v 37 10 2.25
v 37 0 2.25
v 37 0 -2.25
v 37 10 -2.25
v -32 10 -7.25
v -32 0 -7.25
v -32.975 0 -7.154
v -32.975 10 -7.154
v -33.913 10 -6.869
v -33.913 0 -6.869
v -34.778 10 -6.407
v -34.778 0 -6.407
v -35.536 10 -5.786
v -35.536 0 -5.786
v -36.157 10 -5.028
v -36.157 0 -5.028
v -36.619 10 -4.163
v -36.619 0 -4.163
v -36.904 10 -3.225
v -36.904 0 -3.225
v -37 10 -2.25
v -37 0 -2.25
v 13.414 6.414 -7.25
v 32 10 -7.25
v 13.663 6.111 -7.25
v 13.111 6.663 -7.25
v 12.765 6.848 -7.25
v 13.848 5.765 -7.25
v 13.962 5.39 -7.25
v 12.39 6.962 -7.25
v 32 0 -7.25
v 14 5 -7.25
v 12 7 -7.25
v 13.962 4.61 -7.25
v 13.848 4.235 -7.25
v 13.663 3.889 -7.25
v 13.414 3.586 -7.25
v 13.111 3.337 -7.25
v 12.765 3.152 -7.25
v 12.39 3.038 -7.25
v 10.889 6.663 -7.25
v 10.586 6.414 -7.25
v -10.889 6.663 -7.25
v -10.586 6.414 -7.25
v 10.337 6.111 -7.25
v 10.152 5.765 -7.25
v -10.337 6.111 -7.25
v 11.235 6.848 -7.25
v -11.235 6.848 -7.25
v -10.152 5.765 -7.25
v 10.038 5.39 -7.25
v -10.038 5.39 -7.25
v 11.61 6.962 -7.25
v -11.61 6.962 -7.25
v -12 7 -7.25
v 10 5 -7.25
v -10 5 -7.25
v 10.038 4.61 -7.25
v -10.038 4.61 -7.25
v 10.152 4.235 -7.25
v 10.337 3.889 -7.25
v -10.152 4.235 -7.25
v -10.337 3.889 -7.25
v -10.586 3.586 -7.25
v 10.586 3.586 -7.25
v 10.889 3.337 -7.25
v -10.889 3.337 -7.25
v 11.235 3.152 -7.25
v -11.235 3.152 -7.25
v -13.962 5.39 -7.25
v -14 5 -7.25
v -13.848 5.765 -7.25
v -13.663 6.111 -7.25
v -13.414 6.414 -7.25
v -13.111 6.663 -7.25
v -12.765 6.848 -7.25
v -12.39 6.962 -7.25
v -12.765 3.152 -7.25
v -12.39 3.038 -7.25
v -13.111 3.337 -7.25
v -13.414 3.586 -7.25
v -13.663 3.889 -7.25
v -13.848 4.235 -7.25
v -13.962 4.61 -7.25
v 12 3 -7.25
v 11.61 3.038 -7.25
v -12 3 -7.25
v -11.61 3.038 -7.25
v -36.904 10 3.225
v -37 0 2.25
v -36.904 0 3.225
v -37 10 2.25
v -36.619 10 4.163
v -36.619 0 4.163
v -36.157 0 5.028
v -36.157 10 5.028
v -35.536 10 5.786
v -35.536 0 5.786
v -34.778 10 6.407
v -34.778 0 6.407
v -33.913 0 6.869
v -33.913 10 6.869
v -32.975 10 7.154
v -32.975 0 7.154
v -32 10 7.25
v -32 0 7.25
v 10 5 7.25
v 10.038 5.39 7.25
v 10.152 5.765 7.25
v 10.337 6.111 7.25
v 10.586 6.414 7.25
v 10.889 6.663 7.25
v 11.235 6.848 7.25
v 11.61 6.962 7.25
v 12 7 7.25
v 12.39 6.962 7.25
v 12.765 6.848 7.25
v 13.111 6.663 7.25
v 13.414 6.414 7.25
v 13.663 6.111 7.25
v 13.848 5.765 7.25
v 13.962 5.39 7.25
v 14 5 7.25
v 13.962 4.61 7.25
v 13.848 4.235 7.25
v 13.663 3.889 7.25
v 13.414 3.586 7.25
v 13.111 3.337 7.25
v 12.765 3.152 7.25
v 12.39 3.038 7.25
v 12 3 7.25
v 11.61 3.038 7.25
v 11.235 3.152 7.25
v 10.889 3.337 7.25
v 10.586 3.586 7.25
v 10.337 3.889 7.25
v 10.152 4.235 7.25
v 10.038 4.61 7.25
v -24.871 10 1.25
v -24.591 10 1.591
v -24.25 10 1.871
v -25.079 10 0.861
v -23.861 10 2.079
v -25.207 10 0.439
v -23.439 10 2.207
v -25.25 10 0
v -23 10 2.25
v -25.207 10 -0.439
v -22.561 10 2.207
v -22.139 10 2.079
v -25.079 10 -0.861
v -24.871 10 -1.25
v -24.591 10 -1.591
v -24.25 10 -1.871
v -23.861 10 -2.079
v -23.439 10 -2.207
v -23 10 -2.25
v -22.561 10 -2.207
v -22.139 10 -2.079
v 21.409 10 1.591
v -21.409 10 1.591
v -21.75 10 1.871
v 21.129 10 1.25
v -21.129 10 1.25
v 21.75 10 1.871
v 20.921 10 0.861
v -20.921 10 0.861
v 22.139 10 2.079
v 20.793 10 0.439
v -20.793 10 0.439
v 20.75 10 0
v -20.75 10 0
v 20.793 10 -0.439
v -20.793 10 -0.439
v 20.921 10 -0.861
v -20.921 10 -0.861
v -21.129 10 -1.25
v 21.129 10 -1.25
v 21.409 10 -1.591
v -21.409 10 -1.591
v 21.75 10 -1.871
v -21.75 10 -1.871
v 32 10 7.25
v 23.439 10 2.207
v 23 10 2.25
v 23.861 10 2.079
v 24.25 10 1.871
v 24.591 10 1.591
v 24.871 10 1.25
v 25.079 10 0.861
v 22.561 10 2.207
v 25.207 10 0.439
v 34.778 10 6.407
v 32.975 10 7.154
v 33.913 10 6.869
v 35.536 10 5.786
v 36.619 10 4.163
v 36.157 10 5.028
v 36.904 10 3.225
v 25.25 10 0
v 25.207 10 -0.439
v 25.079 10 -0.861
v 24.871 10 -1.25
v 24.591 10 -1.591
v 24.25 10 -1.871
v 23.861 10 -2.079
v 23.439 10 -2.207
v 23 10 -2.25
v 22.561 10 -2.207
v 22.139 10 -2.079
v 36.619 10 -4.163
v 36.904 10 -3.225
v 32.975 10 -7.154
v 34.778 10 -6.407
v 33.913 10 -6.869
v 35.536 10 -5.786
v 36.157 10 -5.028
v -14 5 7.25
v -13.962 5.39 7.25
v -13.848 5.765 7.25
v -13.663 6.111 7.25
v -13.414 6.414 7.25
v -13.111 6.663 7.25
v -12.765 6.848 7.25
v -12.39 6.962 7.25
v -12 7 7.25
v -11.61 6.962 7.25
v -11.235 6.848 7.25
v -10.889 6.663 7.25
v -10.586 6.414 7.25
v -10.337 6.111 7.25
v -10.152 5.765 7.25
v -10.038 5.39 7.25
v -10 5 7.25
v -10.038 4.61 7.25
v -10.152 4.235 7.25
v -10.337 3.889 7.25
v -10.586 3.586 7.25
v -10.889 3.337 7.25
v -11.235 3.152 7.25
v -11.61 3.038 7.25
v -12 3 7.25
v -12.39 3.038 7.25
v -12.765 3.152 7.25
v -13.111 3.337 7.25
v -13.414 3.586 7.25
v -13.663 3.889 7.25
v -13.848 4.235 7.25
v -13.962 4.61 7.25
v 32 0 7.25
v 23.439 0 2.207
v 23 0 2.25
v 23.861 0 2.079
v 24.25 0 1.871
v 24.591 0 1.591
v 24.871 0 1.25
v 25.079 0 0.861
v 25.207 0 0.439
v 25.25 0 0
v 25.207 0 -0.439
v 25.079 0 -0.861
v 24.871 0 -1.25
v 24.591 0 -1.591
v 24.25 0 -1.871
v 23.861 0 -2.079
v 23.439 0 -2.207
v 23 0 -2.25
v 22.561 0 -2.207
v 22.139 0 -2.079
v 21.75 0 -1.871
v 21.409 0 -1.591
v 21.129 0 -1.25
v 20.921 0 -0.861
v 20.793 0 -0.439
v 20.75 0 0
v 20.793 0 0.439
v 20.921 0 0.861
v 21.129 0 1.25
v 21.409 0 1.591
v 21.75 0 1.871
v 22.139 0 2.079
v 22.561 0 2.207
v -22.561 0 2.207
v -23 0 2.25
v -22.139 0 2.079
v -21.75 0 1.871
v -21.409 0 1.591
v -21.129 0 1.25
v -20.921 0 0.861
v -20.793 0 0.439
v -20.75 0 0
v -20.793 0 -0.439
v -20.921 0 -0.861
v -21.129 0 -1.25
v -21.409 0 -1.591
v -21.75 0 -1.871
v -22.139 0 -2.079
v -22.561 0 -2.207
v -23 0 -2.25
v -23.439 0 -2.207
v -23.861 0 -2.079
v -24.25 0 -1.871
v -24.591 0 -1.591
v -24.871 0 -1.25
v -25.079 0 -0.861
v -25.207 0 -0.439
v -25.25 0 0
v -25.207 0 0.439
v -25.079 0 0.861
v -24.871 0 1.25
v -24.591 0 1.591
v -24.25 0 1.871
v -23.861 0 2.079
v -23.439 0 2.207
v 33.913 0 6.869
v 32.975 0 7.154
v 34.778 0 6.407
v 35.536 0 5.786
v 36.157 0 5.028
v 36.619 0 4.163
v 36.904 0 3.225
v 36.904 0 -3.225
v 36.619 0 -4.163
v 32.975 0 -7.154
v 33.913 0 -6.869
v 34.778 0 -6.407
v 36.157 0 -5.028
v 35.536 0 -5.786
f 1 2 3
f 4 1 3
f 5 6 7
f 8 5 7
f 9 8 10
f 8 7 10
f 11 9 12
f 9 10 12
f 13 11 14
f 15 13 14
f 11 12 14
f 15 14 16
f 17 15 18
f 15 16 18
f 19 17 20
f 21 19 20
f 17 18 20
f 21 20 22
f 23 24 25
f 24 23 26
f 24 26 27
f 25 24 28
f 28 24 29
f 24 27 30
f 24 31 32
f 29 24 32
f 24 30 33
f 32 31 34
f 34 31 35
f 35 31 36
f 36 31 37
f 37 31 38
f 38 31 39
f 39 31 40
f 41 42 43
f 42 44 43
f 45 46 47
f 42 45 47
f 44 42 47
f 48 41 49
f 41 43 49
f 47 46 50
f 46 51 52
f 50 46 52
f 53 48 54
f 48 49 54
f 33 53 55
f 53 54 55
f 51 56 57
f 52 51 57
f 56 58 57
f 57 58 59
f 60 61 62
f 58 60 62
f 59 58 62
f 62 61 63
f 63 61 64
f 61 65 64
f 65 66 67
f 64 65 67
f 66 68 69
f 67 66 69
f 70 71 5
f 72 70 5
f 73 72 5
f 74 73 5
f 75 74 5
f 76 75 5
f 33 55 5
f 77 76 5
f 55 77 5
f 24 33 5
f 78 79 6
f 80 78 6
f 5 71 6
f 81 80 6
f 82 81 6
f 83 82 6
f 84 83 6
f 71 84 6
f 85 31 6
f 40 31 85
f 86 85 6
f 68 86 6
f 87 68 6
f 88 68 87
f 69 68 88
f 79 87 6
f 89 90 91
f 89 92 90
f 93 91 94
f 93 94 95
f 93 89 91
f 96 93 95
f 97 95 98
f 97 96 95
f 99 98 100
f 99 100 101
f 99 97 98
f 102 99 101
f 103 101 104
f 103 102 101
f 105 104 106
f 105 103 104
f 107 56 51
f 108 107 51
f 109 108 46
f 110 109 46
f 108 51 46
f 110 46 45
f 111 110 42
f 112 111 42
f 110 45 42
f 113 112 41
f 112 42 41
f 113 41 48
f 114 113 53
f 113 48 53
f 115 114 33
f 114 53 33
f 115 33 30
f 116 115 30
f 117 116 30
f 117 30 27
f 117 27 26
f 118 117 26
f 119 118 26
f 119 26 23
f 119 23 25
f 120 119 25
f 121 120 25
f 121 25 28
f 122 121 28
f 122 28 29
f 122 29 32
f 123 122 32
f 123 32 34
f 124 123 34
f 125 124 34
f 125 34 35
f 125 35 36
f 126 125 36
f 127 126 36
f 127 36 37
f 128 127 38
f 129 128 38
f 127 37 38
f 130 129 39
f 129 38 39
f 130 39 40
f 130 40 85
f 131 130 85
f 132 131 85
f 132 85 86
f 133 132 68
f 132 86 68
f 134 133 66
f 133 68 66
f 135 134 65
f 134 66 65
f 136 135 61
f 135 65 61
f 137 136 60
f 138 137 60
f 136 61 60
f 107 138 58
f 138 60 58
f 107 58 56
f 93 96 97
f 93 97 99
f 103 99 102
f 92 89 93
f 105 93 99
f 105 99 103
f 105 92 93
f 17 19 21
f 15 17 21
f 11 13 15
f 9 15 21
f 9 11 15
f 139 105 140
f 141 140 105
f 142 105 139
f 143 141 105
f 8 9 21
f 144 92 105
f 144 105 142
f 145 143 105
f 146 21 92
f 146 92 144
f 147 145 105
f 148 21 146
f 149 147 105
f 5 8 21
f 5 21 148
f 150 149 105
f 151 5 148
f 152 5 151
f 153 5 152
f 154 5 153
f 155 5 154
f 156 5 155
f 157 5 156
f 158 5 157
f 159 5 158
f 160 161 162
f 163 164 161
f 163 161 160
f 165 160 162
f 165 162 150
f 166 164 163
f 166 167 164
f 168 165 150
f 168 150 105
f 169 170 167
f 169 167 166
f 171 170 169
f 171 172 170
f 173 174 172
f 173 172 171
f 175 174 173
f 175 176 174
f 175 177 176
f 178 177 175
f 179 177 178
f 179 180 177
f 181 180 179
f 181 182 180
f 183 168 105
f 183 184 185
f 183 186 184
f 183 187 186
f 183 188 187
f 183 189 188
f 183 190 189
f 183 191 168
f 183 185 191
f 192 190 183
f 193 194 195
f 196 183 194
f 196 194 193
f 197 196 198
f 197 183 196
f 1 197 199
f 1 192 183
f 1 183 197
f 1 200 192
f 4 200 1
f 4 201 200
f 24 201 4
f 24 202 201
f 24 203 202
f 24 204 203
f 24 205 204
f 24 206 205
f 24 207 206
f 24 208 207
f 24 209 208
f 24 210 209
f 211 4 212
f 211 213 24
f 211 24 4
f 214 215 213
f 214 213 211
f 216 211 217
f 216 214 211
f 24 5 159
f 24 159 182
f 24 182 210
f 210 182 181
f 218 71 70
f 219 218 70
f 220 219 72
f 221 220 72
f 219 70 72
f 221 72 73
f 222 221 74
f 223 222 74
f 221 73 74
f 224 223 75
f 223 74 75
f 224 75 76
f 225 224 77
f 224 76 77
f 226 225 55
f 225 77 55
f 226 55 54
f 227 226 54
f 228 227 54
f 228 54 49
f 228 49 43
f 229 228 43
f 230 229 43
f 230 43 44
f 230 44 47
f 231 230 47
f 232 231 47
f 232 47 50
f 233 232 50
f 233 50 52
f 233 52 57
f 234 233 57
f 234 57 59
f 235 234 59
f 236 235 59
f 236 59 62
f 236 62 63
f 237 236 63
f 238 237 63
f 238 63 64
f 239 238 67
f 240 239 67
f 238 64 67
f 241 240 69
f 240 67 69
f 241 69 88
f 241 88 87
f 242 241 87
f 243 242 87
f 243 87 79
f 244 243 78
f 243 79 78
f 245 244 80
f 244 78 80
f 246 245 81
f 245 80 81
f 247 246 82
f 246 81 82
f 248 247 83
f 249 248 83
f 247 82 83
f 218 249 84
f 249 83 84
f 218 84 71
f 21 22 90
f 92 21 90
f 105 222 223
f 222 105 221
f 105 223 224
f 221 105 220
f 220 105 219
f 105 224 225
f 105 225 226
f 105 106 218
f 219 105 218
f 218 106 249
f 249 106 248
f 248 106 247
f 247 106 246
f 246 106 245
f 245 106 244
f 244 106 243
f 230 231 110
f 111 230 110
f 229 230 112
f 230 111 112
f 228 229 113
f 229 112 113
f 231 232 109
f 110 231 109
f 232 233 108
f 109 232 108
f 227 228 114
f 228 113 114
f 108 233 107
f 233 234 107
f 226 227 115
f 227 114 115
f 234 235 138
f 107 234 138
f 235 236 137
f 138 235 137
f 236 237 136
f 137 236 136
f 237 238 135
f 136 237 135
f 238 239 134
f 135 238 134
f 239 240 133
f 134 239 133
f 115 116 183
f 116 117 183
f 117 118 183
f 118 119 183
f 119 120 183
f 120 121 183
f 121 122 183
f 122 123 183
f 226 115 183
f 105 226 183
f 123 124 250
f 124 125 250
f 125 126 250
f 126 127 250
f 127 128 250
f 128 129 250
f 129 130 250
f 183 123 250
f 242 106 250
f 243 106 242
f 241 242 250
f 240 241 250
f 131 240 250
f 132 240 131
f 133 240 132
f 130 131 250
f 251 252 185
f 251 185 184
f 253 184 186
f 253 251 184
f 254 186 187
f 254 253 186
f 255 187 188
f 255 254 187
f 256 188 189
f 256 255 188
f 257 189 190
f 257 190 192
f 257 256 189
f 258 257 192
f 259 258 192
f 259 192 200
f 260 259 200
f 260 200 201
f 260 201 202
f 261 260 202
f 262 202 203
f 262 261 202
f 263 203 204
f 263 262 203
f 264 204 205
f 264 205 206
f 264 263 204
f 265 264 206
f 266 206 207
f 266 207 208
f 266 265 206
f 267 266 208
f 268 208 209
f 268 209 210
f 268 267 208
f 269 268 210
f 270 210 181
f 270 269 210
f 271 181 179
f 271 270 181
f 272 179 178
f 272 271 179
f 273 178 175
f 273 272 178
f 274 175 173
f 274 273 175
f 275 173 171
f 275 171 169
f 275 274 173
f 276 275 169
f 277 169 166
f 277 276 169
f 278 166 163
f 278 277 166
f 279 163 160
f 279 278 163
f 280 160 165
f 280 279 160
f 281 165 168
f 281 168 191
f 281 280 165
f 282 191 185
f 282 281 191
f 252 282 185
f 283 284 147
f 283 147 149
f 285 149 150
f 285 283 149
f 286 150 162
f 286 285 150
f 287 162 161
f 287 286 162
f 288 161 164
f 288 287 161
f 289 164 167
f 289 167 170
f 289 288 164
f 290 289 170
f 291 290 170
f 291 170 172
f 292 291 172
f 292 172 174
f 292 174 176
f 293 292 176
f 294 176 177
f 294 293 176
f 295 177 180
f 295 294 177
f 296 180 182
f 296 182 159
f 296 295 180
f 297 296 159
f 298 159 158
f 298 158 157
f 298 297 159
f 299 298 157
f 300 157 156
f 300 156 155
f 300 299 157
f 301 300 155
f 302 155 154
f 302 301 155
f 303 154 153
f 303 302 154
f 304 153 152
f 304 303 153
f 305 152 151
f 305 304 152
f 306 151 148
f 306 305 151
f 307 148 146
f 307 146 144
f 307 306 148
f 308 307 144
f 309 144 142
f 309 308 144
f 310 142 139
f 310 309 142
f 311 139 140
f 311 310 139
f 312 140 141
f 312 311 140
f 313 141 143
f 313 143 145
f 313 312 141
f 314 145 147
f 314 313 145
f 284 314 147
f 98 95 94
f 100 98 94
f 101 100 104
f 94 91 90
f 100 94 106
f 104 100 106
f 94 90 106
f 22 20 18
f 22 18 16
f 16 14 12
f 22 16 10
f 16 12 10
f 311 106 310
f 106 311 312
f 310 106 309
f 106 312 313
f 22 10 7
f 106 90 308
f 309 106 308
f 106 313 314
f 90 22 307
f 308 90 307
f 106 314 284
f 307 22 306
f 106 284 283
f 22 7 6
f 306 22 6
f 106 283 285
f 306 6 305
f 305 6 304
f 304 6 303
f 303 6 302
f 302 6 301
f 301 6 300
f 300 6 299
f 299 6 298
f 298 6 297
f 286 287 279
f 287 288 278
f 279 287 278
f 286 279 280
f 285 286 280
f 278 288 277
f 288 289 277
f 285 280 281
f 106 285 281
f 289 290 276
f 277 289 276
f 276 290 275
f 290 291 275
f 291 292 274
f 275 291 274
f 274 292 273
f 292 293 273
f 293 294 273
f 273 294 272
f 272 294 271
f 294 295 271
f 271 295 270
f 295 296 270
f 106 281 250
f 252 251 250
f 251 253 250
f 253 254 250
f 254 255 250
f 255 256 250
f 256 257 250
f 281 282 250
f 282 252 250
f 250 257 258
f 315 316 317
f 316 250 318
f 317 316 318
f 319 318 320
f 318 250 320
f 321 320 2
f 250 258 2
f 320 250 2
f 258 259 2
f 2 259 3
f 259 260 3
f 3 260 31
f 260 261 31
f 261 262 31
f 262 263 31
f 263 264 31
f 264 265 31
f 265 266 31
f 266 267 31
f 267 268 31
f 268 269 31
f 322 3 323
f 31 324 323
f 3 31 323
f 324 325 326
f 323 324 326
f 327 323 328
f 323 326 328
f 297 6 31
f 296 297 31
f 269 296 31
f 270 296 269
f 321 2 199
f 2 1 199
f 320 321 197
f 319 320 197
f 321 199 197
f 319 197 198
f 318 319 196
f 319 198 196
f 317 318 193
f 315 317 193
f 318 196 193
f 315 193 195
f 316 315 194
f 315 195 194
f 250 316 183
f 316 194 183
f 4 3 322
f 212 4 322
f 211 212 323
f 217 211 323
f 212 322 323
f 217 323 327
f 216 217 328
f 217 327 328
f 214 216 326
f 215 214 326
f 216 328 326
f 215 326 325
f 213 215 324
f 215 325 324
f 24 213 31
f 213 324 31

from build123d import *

# Parameters (mm, degrees)
SKETCH1_R           = 2.25
BOSS_EXTRUDE1_DEPTH = 10
FILLET1_R           = 5
SKETCH2_R           = 2
CUT_EXTRUDE1_DEPTH  = 24


with BuildPart() as part:
    # Sketch1 → Boss-Extrude1 (new body)
    with BuildSketch(Plane(origin=(0, 0, 0), x_dir=(1, 0, 0), z_dir=(0, 1, 0))):
        with BuildLine():
            Line((32, 7.25), (-32, 7.25))
            ThreePointArc((-32, 7.25), (-35.535533906, 5.785533906), (-37, 2.25))
            Line((-37, 2.25), (-37, -7.25))
            Line((-37, -7.25), (37, -7.25))
            Line((37, -7.25), (37, 2.25))
            ThreePointArc((37, 2.25), (35.535533906, 5.785533906), (32, 7.25))
        make_face()
        with Locations(Location((23, 0, 0), (0, 0, 270))):
            Circle(SKETCH1_R, mode=Mode.SUBTRACT)
        with Locations(Location((-23, 0, 0), (0, 0, 270))):
            Circle(SKETCH1_R, mode=Mode.SUBTRACT)
    extrude(amount=BOSS_EXTRUDE1_DEPTH)

    # Fillet1
    fillet1_edges = [part.edges().sort_by_distance(p)[0] for p in [
        (37, 5, 7.25),
        (-37, 5, 7.25),
    ]]
    fillet(fillet1_edges, radius=FILLET1_R)

    # Sketch2 → Cut-Extrude1 (cut)
    with BuildSketch(Plane(origin=(0, 0, -7.25), x_dir=(-1, 0, 0), z_dir=(0, 0, -1))):
        with Locations((-12, 5)):
            Circle(SKETCH2_R)
        with Locations((12, 5)):
            Circle(SKETCH2_R)
    extrude(amount=-CUT_EXTRUDE1_DEPTH, mode=Mode.SUBTRACT)


solid = part.part
